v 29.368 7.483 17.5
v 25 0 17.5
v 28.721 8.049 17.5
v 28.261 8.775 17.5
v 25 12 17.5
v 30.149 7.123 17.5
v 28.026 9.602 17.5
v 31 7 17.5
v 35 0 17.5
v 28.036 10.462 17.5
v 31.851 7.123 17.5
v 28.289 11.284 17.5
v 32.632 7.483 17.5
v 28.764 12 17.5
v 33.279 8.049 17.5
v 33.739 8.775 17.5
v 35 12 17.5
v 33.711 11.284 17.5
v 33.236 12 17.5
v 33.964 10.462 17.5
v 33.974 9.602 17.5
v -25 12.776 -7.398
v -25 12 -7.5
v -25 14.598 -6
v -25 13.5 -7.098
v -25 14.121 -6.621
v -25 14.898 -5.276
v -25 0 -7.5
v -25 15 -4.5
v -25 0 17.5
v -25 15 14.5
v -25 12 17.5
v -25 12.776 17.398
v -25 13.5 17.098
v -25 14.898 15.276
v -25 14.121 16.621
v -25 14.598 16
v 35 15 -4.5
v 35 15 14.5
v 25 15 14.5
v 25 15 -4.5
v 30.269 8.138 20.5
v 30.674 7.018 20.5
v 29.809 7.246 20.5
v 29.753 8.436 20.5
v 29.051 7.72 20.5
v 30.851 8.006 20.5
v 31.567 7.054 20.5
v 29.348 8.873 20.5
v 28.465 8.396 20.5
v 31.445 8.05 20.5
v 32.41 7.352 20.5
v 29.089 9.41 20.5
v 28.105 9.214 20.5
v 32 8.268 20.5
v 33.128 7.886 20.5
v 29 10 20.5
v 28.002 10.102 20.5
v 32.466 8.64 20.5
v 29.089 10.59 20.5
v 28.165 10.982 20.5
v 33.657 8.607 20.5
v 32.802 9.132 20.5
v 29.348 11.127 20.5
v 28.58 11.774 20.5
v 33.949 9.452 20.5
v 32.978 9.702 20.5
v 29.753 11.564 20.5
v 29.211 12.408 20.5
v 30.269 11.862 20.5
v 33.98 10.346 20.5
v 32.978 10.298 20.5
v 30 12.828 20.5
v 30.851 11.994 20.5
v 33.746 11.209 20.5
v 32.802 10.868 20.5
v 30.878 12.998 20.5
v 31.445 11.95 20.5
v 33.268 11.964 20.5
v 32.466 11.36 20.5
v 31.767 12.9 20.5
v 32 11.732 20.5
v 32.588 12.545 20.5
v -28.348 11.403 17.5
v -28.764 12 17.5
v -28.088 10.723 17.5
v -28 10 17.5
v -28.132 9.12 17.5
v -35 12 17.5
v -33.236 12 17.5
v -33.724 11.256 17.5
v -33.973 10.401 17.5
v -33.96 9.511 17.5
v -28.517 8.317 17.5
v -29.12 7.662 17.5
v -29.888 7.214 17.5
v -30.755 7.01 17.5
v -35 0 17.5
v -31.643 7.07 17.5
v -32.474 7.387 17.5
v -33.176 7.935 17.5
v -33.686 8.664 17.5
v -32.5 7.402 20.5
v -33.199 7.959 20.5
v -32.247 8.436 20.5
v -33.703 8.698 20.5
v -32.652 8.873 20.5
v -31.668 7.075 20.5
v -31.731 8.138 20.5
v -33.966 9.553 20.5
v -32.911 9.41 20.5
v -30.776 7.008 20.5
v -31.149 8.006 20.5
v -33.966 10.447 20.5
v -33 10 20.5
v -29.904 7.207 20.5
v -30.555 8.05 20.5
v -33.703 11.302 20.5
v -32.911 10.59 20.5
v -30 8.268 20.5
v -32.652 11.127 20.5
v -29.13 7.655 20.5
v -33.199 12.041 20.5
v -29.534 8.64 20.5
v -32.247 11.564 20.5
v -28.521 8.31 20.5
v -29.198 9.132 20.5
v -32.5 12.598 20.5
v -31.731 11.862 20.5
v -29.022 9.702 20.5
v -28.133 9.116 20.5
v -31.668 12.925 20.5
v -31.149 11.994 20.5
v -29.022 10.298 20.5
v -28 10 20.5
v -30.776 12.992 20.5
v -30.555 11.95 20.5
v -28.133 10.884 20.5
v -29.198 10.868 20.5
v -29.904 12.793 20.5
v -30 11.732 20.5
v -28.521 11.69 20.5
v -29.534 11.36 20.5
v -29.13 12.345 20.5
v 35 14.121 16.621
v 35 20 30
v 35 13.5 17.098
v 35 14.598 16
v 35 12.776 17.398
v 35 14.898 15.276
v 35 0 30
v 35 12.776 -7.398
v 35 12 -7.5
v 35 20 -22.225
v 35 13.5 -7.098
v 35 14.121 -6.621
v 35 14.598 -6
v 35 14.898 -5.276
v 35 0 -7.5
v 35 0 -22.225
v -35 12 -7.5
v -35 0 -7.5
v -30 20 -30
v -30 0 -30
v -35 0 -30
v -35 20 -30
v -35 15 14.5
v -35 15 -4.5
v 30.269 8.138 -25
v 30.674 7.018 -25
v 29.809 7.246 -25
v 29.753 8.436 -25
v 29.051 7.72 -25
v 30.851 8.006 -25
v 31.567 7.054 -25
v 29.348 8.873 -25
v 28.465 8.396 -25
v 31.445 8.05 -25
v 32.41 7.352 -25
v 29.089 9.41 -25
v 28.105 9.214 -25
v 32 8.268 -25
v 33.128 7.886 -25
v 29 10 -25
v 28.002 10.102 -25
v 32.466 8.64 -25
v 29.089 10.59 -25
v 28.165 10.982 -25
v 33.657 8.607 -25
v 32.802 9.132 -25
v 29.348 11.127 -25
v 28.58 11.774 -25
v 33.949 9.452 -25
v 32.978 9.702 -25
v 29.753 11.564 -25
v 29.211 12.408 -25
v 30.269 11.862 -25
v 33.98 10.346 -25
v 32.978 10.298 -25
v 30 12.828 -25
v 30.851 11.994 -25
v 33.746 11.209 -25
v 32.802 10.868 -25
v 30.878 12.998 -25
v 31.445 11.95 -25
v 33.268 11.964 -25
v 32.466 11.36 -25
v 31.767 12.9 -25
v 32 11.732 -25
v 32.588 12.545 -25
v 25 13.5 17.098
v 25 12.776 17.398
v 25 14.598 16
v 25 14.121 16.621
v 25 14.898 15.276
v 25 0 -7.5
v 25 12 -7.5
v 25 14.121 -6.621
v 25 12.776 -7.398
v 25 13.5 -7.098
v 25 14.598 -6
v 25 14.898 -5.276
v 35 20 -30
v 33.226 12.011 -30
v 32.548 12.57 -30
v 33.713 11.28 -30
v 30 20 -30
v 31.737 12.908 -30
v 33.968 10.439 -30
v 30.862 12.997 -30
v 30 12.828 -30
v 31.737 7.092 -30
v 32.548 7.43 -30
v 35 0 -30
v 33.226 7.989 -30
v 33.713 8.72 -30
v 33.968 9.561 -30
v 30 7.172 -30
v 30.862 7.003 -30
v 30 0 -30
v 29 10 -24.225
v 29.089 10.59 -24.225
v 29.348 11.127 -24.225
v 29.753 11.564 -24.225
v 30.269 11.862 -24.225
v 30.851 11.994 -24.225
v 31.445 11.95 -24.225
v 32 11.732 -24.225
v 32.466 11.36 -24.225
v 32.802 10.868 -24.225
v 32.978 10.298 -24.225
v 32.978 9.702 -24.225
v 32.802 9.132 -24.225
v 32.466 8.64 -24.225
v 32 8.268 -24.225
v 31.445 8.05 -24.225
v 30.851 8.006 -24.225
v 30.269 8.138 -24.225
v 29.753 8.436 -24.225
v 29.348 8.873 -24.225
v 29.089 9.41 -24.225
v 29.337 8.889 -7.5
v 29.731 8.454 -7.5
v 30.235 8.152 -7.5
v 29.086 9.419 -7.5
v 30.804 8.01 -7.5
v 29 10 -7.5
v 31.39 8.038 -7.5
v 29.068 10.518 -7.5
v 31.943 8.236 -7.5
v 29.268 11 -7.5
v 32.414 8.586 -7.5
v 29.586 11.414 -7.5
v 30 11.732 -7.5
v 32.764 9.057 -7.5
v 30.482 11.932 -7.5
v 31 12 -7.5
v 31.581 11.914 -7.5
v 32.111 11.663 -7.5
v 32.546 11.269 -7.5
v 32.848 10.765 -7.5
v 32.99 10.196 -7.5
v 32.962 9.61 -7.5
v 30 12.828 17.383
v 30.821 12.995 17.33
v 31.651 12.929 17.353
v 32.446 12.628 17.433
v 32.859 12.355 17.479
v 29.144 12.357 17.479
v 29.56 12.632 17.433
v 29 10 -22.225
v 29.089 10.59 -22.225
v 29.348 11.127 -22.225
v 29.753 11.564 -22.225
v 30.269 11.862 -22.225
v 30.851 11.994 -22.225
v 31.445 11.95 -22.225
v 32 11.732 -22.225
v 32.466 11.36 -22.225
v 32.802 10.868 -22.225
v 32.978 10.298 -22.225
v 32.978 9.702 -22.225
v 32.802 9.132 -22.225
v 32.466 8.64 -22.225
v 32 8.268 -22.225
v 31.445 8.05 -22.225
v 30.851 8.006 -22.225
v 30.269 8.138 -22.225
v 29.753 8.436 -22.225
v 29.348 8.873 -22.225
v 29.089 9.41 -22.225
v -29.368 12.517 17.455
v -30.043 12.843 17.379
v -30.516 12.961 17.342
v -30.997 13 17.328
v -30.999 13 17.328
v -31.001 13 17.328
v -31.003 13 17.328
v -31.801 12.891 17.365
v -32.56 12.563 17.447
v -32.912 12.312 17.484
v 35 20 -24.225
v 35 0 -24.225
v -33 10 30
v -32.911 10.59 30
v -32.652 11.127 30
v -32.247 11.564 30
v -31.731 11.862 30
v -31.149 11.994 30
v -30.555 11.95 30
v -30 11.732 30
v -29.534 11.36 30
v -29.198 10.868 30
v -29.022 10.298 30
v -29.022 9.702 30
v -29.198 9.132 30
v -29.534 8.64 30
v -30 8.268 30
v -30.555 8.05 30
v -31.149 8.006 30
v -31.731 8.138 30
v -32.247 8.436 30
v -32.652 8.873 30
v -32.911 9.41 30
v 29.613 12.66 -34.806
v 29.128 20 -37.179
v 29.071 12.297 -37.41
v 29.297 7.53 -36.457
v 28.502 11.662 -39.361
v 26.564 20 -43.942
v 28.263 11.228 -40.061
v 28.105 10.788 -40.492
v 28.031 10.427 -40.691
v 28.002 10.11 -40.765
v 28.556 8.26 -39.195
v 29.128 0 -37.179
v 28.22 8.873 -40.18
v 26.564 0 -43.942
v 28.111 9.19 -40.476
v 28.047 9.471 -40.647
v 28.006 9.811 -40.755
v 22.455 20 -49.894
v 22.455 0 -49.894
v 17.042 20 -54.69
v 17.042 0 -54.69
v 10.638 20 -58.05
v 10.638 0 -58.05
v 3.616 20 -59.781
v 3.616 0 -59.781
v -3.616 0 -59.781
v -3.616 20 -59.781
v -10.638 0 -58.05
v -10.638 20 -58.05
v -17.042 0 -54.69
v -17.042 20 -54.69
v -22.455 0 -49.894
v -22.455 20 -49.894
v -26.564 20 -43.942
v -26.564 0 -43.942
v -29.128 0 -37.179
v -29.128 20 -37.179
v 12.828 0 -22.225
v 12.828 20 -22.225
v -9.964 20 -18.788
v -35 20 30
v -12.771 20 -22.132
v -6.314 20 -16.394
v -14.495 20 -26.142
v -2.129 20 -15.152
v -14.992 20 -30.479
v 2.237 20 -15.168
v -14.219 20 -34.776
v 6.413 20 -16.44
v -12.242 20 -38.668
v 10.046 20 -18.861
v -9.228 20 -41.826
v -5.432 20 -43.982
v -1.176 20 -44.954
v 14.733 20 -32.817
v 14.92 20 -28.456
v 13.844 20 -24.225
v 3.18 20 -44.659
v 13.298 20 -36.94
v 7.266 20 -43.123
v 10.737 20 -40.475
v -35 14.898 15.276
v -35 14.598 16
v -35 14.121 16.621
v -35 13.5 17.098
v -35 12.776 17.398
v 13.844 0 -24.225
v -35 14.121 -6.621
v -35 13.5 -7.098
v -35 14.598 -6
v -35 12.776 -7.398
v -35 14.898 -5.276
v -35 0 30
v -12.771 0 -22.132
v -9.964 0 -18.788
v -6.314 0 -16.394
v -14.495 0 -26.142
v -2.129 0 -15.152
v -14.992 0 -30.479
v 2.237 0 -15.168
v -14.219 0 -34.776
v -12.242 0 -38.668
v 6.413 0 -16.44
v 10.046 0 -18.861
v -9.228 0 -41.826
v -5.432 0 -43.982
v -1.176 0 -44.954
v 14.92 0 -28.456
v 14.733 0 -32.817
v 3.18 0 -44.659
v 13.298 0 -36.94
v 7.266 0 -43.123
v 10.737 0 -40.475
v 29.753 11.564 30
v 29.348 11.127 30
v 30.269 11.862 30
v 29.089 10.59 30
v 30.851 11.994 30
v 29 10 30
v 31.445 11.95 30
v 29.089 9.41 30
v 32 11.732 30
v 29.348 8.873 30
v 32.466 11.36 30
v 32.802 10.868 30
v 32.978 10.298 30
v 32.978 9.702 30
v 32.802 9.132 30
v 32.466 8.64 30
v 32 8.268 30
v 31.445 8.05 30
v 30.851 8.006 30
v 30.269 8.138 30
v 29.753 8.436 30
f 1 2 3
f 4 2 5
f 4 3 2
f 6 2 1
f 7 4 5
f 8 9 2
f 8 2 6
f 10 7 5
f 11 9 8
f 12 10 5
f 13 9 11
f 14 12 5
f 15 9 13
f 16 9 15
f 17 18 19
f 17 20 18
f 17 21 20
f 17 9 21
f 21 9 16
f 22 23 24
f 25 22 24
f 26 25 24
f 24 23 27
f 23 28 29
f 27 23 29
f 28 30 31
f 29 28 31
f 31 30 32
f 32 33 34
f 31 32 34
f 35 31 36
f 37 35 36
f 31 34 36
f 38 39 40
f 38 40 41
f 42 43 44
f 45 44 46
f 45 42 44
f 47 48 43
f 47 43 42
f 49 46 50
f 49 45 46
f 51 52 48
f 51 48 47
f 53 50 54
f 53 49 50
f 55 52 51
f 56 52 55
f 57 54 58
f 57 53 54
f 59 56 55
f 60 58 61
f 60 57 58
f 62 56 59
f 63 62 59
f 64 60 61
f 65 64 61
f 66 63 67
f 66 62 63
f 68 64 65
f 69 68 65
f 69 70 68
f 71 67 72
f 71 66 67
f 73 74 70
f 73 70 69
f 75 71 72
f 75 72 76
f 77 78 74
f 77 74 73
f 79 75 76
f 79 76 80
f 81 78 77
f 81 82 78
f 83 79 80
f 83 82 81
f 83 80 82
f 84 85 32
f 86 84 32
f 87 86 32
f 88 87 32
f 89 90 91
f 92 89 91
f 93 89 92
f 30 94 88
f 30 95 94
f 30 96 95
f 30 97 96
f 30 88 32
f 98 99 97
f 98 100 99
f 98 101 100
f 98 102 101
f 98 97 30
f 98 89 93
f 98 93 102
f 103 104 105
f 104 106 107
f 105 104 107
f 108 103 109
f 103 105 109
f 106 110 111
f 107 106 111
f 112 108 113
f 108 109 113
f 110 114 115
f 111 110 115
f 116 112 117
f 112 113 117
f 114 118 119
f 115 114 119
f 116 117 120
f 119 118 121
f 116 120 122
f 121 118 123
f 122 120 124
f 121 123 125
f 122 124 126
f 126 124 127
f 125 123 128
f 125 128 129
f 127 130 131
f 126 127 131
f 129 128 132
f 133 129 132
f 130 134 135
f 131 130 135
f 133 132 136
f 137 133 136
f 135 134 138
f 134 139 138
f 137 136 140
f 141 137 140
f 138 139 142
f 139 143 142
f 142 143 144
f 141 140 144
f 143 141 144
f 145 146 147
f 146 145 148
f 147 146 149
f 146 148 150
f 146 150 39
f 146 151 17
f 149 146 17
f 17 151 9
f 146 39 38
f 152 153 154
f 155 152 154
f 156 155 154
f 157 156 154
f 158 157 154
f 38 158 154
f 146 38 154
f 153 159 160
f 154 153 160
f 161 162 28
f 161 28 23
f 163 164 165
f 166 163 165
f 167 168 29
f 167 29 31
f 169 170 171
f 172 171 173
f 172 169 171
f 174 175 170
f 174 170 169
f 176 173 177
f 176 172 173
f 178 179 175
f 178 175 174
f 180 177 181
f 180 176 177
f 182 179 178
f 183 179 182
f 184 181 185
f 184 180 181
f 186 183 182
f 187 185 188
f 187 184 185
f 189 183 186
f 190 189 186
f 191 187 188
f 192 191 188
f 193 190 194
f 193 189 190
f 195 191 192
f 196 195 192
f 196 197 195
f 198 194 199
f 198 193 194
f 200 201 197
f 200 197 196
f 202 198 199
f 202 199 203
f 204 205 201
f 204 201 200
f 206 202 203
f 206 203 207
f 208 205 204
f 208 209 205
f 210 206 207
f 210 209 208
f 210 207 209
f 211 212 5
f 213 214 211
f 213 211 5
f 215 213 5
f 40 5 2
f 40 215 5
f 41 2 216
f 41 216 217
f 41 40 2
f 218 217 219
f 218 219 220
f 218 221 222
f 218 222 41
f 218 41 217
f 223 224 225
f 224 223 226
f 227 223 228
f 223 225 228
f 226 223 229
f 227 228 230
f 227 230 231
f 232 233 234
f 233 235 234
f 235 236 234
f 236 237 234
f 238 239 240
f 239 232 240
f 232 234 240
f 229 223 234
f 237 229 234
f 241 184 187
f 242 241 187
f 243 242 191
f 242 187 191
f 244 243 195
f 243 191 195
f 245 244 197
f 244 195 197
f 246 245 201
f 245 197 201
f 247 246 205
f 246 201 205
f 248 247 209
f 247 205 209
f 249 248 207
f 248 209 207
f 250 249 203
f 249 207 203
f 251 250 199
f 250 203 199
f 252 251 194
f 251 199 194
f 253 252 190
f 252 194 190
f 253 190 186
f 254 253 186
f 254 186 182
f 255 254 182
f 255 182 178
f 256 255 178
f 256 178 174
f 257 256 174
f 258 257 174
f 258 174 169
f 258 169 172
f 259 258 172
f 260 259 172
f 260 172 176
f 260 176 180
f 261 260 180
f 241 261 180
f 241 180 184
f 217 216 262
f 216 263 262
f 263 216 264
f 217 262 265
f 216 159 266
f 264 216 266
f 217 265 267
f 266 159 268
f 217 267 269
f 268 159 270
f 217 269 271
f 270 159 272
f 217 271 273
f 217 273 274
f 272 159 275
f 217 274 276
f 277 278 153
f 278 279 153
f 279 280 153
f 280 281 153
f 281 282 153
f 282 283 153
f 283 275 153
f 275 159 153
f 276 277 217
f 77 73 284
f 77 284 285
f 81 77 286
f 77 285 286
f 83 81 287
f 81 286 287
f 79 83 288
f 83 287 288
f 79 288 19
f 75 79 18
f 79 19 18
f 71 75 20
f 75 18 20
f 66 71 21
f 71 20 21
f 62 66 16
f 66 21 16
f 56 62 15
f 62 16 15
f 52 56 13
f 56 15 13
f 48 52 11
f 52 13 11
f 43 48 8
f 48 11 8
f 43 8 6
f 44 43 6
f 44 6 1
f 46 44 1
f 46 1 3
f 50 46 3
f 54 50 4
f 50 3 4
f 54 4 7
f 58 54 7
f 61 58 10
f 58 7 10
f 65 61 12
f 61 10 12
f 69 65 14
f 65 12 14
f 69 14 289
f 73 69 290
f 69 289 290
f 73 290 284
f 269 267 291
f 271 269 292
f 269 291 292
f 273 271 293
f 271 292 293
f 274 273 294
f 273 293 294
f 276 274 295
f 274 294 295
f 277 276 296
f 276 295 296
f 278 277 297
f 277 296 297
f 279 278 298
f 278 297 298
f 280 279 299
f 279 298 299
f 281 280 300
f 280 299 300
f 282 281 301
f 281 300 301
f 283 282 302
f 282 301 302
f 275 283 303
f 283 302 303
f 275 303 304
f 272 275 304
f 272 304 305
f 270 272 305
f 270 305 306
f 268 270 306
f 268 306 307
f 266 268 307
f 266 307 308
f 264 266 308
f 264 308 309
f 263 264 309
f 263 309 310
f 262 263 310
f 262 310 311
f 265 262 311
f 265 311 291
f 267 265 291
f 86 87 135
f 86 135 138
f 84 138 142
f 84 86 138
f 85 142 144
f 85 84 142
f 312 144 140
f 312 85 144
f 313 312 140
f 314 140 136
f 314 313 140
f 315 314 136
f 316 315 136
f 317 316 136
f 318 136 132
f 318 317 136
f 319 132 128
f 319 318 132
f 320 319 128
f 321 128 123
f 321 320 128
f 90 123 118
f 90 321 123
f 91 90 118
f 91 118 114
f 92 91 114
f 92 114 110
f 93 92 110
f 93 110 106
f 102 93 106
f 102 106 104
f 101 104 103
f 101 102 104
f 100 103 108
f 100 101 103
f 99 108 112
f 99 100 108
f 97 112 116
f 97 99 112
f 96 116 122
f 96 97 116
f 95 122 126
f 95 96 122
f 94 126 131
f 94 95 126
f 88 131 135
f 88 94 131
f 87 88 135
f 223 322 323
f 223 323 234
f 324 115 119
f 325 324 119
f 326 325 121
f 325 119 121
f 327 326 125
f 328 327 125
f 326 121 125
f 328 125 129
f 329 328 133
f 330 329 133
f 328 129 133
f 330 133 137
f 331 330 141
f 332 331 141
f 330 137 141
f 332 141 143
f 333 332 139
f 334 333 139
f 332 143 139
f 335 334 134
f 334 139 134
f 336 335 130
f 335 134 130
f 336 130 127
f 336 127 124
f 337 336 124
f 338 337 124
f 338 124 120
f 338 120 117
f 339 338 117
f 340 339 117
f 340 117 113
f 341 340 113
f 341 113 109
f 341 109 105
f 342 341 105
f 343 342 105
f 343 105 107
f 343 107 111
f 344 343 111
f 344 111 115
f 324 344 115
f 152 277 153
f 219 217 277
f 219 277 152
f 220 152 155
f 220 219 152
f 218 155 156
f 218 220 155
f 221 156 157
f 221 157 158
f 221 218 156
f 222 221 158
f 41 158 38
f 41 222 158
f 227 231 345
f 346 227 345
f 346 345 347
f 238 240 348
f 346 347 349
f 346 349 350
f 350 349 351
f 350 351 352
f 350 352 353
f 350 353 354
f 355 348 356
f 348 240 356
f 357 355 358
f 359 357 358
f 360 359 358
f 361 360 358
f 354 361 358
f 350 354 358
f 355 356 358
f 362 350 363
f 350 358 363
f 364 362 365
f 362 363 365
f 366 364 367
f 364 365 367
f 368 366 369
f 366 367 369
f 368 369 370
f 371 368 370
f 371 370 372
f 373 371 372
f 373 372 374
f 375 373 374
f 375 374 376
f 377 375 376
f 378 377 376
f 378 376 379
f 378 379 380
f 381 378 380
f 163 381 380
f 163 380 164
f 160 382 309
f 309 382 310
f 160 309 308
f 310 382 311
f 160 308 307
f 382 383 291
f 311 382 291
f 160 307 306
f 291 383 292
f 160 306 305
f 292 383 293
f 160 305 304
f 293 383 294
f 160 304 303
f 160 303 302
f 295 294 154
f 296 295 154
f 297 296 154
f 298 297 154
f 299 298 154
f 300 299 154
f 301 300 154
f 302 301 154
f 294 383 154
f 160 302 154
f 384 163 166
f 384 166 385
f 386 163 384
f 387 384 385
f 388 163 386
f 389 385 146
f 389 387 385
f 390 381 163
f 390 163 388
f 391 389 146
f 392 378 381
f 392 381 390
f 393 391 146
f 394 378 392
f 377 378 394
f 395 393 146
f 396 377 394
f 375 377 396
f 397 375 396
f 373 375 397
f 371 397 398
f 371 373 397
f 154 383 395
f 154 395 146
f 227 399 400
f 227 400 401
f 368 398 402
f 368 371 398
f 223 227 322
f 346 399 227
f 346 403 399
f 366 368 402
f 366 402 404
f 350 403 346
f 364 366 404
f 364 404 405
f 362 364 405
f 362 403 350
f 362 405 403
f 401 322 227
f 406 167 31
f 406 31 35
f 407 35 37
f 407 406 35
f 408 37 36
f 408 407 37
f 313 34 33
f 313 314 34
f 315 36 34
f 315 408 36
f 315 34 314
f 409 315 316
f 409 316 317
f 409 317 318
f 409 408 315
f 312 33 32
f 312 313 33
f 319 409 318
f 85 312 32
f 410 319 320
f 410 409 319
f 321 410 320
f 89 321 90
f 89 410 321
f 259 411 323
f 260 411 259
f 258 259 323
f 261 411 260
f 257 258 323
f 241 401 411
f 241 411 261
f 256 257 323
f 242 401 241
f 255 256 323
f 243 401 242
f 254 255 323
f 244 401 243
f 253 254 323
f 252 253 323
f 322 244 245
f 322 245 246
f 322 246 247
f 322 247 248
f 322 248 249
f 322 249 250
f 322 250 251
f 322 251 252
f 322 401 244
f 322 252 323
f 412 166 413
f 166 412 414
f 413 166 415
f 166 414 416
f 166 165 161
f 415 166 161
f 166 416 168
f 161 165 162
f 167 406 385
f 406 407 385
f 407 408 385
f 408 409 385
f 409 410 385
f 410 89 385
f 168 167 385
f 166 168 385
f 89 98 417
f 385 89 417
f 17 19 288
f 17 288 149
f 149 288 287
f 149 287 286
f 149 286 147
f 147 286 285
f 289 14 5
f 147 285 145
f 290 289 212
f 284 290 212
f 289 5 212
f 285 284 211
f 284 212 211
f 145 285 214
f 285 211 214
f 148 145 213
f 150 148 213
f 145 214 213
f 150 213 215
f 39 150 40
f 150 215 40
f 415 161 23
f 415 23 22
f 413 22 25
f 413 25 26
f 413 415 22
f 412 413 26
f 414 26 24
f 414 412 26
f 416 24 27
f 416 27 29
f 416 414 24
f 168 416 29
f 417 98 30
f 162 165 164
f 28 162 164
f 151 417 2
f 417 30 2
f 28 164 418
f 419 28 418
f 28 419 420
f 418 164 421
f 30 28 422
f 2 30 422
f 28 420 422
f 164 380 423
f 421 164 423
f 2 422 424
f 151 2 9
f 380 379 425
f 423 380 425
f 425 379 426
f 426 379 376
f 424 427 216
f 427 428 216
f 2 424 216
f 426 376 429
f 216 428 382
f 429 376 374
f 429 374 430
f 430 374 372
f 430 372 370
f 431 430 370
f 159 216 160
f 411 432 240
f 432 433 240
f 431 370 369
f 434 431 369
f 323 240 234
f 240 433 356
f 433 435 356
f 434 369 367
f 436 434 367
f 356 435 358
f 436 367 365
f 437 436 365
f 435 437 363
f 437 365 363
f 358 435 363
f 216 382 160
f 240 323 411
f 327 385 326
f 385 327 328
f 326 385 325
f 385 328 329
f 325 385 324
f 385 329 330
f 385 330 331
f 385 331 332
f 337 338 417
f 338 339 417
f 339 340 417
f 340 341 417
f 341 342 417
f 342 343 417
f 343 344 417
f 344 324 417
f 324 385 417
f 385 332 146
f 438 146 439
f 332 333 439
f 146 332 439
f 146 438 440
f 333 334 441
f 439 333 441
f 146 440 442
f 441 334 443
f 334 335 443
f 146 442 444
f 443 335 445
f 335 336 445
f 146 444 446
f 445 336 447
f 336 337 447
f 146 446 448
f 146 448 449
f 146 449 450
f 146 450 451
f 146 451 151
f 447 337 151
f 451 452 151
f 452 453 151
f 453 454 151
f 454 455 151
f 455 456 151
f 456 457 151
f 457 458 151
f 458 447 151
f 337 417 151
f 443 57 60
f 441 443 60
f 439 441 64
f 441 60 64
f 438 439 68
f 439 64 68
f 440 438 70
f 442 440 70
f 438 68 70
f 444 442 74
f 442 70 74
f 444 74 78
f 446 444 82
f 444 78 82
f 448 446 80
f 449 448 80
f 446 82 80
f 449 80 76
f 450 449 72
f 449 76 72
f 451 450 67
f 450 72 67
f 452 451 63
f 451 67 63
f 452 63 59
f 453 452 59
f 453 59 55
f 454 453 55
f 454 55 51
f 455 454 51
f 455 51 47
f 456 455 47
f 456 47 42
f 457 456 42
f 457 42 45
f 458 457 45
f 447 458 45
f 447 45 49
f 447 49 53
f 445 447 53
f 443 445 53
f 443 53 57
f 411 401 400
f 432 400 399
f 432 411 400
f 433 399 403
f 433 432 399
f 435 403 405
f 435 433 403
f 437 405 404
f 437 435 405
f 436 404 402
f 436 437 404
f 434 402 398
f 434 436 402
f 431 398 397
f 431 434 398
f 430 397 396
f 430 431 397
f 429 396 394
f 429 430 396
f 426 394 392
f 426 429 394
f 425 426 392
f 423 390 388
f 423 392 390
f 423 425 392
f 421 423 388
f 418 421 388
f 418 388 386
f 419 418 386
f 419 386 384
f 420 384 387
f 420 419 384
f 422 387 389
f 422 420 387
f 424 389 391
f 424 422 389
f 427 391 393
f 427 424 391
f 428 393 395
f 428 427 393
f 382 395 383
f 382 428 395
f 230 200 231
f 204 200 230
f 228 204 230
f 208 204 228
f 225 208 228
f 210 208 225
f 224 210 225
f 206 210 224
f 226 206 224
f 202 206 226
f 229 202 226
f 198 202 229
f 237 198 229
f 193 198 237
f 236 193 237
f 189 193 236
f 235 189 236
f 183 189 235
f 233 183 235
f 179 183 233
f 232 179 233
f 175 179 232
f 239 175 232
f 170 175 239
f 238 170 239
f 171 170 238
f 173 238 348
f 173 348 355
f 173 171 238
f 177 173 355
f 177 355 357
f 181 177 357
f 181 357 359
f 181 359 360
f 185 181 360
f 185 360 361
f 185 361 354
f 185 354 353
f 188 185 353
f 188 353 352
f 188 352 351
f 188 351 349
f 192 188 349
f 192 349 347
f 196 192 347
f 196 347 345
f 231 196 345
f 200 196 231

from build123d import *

# Parameters (mm, degrees)
SKETCH_1_R               = 15
EXTRUDE_1_DEPTH          = 20
SKETCH_2_W               = 80.970939558
SKETCH_2_H               = 2
CUT_EXTRUDE_1_DEPTH      = 73.284161474
SKETCH_3_W               = 25
SKETCH_3_H               = 30
CUT_EXTRUDE_2_DEPTH      = 10
FILLET_1_R               = 3
CUT_EXTRUDE_3_DEPTH      = 53
CUT_EXTRUDE_3_DEPTH_BACK = 5
SKETCH_4_R               = 3
SKETCH_5_R               = 2
CUT_EXTRUDE_4_DEPTH      = 69.190908514
SKETCH_6_R               = 3
CUT_EXTRUDE_5_DEPTH      = 3
MIRROR_START             = -35
MIRROR_1_DEPTH           = 10
MIRROR_START_2           = 17.3284275
MIRROR_1_2_OUTLINE_R     = 3
MIRROR_1_2_DEPTH         = 3.1715725
SKETCH_7_R               = 2
CUT_EXTRUDE_6_DEPTH      = 42


with BuildPart() as part:
    # 草图1 → 凸台-拉伸1 (new body)
    with BuildSketch(Plane(origin=(0, 0, 0), x_dir=(1, 0, 0), z_dir=(0, 1, 0))):
        with BuildLine():
            Line((-30, 30), (-35, 30))
            Line((-35, 30), (-35, -30))
            Line((-35, -30), (35, -30))
            Line((35, -30), (35, 30))
            Line((35, 30), (30, 30))
            ThreePointArc((30, 30), (0, 60), (-30, 30))
        make_face()
        with Locations(Location((0, 30, 0), (0, 0, 270))):
            Circle(SKETCH_1_R, mode=Mode.SUBTRACT)
    extrude(amount=EXTRUDE_1_DEPTH)

    # 草图2 → 切除-拉伸1 (cut, through all)
    with BuildSketch(Plane(origin=(0, 20, 0), x_dir=(1, 0, 0), z_dir=(0, 1, 0))):
        with Locations((35, 23.224842932)):
            Rectangle(SKETCH_2_W, SKETCH_2_H)
    extrude(amount=-CUT_EXTRUDE_1_DEPTH, mode=Mode.SUBTRACT)

    # 草图3 → 切除-拉伸2 (cut)
    with BuildSketch(Plane(origin=(35, 0, 0), x_dir=(0, 0, -1), z_dir=(1, 0, 0))):
        with Locations((-5, 0)):
            Rectangle(SKETCH_3_W, SKETCH_3_H)
    extrude(amount=-CUT_EXTRUDE_2_DEPTH, mode=Mode.SUBTRACT)

    # 圆角1
    fillet_1_edges = [part.edges().sort_by_distance(p)[0] for p in [
        (30, 15, -7.5),
        (30, 15, 17.5),
    ]]
    fillet(fillet_1_edges, radius=FILLET_1_R)

    # 草图4 → 切除-拉伸3 (cut, two sides: drawn at the far end of the back side and taken through both)
    with BuildSketch(Plane(origin=(0, 0, -30), x_dir=(-1, 0, 0), z_dir=(0, 0, -1)).offset(-CUT_EXTRUDE_3_DEPTH_BACK)):
        with Locations(Location((-31, 10, 0), (0, 0, 70.528779366))):
            Circle(SKETCH_4_R)
    extrude(amount=CUT_EXTRUDE_3_DEPTH + CUT_EXTRUDE_3_DEPTH_BACK, mode=Mode.SUBTRACT)

    # 草图5 → 切除-拉伸4 (cut, through all)
    with BuildSketch(Plane(origin=(0, 0, -25), x_dir=(-1, 0, 0), z_dir=(0, 0, -1))):
        with Locations((-31, 10)):
            Circle(SKETCH_5_R)
    extrude(amount=-CUT_EXTRUDE_4_DEPTH, mode=Mode.SUBTRACT)

    # 草图6 → 切除-拉伸5 (cut, symmetric)
    with BuildSketch(Plane(origin=(0, 0, 17.5), x_dir=(-1, 0, 0), z_dir=(0, 0, -1))):
        with Locations(Location((-31, 10, 0), (0, 0, 70.528779366))):
            Circle(SKETCH_6_R)
    extrude(amount=CUT_EXTRUDE_5_DEPTH, both=True, mode=Mode.SUBTRACT)

    # 镜向1: read off the stored shape, not the designer's step
    # 镜向1 outline → 镜向1 (cut)
    with BuildSketch(Plane.YZ.offset(MIRROR_START)):
        with BuildLine():
            Line((12, 17.5), (0, 17.5))
            Line((0, 17.5), (0, -7.5))
            Line((0, -7.5), (12, -7.5))
            ThreePointArc((12, -7.5), (14.121320344, -6.621320344), (15, -4.5))
            Line((15, -4.5), (15, 14.5))
            ThreePointArc((15, 14.5), (14.121320344, 16.621320344), (12, 17.5))
        make_face()
    extrude(amount=MIRROR_1_DEPTH, mode=Mode.SUBTRACT)

    # Mirror 1 2 outline → Mirror 1 2 (cut)
    with BuildSketch(Plane.XY.offset(MIRROR_START_2)):
        with Locations((-31, 10)):
            Circle(MIRROR_1_2_OUTLINE_R)
    extrude(amount=MIRROR_1_2_DEPTH, mode=Mode.SUBTRACT)

    # 草图7 → 切除-拉伸6 (cut)
    with BuildSketch(Plane(origin=(0, 0, 20.5), x_dir=(-1, 0, 0), z_dir=(0, 0, -1))):
        with Locations((31, 10)):
            Circle(SKETCH_7_R)
    extrude(amount=-CUT_EXTRUDE_6_DEPTH, mode=Mode.SUBTRACT)


solid = part.part
